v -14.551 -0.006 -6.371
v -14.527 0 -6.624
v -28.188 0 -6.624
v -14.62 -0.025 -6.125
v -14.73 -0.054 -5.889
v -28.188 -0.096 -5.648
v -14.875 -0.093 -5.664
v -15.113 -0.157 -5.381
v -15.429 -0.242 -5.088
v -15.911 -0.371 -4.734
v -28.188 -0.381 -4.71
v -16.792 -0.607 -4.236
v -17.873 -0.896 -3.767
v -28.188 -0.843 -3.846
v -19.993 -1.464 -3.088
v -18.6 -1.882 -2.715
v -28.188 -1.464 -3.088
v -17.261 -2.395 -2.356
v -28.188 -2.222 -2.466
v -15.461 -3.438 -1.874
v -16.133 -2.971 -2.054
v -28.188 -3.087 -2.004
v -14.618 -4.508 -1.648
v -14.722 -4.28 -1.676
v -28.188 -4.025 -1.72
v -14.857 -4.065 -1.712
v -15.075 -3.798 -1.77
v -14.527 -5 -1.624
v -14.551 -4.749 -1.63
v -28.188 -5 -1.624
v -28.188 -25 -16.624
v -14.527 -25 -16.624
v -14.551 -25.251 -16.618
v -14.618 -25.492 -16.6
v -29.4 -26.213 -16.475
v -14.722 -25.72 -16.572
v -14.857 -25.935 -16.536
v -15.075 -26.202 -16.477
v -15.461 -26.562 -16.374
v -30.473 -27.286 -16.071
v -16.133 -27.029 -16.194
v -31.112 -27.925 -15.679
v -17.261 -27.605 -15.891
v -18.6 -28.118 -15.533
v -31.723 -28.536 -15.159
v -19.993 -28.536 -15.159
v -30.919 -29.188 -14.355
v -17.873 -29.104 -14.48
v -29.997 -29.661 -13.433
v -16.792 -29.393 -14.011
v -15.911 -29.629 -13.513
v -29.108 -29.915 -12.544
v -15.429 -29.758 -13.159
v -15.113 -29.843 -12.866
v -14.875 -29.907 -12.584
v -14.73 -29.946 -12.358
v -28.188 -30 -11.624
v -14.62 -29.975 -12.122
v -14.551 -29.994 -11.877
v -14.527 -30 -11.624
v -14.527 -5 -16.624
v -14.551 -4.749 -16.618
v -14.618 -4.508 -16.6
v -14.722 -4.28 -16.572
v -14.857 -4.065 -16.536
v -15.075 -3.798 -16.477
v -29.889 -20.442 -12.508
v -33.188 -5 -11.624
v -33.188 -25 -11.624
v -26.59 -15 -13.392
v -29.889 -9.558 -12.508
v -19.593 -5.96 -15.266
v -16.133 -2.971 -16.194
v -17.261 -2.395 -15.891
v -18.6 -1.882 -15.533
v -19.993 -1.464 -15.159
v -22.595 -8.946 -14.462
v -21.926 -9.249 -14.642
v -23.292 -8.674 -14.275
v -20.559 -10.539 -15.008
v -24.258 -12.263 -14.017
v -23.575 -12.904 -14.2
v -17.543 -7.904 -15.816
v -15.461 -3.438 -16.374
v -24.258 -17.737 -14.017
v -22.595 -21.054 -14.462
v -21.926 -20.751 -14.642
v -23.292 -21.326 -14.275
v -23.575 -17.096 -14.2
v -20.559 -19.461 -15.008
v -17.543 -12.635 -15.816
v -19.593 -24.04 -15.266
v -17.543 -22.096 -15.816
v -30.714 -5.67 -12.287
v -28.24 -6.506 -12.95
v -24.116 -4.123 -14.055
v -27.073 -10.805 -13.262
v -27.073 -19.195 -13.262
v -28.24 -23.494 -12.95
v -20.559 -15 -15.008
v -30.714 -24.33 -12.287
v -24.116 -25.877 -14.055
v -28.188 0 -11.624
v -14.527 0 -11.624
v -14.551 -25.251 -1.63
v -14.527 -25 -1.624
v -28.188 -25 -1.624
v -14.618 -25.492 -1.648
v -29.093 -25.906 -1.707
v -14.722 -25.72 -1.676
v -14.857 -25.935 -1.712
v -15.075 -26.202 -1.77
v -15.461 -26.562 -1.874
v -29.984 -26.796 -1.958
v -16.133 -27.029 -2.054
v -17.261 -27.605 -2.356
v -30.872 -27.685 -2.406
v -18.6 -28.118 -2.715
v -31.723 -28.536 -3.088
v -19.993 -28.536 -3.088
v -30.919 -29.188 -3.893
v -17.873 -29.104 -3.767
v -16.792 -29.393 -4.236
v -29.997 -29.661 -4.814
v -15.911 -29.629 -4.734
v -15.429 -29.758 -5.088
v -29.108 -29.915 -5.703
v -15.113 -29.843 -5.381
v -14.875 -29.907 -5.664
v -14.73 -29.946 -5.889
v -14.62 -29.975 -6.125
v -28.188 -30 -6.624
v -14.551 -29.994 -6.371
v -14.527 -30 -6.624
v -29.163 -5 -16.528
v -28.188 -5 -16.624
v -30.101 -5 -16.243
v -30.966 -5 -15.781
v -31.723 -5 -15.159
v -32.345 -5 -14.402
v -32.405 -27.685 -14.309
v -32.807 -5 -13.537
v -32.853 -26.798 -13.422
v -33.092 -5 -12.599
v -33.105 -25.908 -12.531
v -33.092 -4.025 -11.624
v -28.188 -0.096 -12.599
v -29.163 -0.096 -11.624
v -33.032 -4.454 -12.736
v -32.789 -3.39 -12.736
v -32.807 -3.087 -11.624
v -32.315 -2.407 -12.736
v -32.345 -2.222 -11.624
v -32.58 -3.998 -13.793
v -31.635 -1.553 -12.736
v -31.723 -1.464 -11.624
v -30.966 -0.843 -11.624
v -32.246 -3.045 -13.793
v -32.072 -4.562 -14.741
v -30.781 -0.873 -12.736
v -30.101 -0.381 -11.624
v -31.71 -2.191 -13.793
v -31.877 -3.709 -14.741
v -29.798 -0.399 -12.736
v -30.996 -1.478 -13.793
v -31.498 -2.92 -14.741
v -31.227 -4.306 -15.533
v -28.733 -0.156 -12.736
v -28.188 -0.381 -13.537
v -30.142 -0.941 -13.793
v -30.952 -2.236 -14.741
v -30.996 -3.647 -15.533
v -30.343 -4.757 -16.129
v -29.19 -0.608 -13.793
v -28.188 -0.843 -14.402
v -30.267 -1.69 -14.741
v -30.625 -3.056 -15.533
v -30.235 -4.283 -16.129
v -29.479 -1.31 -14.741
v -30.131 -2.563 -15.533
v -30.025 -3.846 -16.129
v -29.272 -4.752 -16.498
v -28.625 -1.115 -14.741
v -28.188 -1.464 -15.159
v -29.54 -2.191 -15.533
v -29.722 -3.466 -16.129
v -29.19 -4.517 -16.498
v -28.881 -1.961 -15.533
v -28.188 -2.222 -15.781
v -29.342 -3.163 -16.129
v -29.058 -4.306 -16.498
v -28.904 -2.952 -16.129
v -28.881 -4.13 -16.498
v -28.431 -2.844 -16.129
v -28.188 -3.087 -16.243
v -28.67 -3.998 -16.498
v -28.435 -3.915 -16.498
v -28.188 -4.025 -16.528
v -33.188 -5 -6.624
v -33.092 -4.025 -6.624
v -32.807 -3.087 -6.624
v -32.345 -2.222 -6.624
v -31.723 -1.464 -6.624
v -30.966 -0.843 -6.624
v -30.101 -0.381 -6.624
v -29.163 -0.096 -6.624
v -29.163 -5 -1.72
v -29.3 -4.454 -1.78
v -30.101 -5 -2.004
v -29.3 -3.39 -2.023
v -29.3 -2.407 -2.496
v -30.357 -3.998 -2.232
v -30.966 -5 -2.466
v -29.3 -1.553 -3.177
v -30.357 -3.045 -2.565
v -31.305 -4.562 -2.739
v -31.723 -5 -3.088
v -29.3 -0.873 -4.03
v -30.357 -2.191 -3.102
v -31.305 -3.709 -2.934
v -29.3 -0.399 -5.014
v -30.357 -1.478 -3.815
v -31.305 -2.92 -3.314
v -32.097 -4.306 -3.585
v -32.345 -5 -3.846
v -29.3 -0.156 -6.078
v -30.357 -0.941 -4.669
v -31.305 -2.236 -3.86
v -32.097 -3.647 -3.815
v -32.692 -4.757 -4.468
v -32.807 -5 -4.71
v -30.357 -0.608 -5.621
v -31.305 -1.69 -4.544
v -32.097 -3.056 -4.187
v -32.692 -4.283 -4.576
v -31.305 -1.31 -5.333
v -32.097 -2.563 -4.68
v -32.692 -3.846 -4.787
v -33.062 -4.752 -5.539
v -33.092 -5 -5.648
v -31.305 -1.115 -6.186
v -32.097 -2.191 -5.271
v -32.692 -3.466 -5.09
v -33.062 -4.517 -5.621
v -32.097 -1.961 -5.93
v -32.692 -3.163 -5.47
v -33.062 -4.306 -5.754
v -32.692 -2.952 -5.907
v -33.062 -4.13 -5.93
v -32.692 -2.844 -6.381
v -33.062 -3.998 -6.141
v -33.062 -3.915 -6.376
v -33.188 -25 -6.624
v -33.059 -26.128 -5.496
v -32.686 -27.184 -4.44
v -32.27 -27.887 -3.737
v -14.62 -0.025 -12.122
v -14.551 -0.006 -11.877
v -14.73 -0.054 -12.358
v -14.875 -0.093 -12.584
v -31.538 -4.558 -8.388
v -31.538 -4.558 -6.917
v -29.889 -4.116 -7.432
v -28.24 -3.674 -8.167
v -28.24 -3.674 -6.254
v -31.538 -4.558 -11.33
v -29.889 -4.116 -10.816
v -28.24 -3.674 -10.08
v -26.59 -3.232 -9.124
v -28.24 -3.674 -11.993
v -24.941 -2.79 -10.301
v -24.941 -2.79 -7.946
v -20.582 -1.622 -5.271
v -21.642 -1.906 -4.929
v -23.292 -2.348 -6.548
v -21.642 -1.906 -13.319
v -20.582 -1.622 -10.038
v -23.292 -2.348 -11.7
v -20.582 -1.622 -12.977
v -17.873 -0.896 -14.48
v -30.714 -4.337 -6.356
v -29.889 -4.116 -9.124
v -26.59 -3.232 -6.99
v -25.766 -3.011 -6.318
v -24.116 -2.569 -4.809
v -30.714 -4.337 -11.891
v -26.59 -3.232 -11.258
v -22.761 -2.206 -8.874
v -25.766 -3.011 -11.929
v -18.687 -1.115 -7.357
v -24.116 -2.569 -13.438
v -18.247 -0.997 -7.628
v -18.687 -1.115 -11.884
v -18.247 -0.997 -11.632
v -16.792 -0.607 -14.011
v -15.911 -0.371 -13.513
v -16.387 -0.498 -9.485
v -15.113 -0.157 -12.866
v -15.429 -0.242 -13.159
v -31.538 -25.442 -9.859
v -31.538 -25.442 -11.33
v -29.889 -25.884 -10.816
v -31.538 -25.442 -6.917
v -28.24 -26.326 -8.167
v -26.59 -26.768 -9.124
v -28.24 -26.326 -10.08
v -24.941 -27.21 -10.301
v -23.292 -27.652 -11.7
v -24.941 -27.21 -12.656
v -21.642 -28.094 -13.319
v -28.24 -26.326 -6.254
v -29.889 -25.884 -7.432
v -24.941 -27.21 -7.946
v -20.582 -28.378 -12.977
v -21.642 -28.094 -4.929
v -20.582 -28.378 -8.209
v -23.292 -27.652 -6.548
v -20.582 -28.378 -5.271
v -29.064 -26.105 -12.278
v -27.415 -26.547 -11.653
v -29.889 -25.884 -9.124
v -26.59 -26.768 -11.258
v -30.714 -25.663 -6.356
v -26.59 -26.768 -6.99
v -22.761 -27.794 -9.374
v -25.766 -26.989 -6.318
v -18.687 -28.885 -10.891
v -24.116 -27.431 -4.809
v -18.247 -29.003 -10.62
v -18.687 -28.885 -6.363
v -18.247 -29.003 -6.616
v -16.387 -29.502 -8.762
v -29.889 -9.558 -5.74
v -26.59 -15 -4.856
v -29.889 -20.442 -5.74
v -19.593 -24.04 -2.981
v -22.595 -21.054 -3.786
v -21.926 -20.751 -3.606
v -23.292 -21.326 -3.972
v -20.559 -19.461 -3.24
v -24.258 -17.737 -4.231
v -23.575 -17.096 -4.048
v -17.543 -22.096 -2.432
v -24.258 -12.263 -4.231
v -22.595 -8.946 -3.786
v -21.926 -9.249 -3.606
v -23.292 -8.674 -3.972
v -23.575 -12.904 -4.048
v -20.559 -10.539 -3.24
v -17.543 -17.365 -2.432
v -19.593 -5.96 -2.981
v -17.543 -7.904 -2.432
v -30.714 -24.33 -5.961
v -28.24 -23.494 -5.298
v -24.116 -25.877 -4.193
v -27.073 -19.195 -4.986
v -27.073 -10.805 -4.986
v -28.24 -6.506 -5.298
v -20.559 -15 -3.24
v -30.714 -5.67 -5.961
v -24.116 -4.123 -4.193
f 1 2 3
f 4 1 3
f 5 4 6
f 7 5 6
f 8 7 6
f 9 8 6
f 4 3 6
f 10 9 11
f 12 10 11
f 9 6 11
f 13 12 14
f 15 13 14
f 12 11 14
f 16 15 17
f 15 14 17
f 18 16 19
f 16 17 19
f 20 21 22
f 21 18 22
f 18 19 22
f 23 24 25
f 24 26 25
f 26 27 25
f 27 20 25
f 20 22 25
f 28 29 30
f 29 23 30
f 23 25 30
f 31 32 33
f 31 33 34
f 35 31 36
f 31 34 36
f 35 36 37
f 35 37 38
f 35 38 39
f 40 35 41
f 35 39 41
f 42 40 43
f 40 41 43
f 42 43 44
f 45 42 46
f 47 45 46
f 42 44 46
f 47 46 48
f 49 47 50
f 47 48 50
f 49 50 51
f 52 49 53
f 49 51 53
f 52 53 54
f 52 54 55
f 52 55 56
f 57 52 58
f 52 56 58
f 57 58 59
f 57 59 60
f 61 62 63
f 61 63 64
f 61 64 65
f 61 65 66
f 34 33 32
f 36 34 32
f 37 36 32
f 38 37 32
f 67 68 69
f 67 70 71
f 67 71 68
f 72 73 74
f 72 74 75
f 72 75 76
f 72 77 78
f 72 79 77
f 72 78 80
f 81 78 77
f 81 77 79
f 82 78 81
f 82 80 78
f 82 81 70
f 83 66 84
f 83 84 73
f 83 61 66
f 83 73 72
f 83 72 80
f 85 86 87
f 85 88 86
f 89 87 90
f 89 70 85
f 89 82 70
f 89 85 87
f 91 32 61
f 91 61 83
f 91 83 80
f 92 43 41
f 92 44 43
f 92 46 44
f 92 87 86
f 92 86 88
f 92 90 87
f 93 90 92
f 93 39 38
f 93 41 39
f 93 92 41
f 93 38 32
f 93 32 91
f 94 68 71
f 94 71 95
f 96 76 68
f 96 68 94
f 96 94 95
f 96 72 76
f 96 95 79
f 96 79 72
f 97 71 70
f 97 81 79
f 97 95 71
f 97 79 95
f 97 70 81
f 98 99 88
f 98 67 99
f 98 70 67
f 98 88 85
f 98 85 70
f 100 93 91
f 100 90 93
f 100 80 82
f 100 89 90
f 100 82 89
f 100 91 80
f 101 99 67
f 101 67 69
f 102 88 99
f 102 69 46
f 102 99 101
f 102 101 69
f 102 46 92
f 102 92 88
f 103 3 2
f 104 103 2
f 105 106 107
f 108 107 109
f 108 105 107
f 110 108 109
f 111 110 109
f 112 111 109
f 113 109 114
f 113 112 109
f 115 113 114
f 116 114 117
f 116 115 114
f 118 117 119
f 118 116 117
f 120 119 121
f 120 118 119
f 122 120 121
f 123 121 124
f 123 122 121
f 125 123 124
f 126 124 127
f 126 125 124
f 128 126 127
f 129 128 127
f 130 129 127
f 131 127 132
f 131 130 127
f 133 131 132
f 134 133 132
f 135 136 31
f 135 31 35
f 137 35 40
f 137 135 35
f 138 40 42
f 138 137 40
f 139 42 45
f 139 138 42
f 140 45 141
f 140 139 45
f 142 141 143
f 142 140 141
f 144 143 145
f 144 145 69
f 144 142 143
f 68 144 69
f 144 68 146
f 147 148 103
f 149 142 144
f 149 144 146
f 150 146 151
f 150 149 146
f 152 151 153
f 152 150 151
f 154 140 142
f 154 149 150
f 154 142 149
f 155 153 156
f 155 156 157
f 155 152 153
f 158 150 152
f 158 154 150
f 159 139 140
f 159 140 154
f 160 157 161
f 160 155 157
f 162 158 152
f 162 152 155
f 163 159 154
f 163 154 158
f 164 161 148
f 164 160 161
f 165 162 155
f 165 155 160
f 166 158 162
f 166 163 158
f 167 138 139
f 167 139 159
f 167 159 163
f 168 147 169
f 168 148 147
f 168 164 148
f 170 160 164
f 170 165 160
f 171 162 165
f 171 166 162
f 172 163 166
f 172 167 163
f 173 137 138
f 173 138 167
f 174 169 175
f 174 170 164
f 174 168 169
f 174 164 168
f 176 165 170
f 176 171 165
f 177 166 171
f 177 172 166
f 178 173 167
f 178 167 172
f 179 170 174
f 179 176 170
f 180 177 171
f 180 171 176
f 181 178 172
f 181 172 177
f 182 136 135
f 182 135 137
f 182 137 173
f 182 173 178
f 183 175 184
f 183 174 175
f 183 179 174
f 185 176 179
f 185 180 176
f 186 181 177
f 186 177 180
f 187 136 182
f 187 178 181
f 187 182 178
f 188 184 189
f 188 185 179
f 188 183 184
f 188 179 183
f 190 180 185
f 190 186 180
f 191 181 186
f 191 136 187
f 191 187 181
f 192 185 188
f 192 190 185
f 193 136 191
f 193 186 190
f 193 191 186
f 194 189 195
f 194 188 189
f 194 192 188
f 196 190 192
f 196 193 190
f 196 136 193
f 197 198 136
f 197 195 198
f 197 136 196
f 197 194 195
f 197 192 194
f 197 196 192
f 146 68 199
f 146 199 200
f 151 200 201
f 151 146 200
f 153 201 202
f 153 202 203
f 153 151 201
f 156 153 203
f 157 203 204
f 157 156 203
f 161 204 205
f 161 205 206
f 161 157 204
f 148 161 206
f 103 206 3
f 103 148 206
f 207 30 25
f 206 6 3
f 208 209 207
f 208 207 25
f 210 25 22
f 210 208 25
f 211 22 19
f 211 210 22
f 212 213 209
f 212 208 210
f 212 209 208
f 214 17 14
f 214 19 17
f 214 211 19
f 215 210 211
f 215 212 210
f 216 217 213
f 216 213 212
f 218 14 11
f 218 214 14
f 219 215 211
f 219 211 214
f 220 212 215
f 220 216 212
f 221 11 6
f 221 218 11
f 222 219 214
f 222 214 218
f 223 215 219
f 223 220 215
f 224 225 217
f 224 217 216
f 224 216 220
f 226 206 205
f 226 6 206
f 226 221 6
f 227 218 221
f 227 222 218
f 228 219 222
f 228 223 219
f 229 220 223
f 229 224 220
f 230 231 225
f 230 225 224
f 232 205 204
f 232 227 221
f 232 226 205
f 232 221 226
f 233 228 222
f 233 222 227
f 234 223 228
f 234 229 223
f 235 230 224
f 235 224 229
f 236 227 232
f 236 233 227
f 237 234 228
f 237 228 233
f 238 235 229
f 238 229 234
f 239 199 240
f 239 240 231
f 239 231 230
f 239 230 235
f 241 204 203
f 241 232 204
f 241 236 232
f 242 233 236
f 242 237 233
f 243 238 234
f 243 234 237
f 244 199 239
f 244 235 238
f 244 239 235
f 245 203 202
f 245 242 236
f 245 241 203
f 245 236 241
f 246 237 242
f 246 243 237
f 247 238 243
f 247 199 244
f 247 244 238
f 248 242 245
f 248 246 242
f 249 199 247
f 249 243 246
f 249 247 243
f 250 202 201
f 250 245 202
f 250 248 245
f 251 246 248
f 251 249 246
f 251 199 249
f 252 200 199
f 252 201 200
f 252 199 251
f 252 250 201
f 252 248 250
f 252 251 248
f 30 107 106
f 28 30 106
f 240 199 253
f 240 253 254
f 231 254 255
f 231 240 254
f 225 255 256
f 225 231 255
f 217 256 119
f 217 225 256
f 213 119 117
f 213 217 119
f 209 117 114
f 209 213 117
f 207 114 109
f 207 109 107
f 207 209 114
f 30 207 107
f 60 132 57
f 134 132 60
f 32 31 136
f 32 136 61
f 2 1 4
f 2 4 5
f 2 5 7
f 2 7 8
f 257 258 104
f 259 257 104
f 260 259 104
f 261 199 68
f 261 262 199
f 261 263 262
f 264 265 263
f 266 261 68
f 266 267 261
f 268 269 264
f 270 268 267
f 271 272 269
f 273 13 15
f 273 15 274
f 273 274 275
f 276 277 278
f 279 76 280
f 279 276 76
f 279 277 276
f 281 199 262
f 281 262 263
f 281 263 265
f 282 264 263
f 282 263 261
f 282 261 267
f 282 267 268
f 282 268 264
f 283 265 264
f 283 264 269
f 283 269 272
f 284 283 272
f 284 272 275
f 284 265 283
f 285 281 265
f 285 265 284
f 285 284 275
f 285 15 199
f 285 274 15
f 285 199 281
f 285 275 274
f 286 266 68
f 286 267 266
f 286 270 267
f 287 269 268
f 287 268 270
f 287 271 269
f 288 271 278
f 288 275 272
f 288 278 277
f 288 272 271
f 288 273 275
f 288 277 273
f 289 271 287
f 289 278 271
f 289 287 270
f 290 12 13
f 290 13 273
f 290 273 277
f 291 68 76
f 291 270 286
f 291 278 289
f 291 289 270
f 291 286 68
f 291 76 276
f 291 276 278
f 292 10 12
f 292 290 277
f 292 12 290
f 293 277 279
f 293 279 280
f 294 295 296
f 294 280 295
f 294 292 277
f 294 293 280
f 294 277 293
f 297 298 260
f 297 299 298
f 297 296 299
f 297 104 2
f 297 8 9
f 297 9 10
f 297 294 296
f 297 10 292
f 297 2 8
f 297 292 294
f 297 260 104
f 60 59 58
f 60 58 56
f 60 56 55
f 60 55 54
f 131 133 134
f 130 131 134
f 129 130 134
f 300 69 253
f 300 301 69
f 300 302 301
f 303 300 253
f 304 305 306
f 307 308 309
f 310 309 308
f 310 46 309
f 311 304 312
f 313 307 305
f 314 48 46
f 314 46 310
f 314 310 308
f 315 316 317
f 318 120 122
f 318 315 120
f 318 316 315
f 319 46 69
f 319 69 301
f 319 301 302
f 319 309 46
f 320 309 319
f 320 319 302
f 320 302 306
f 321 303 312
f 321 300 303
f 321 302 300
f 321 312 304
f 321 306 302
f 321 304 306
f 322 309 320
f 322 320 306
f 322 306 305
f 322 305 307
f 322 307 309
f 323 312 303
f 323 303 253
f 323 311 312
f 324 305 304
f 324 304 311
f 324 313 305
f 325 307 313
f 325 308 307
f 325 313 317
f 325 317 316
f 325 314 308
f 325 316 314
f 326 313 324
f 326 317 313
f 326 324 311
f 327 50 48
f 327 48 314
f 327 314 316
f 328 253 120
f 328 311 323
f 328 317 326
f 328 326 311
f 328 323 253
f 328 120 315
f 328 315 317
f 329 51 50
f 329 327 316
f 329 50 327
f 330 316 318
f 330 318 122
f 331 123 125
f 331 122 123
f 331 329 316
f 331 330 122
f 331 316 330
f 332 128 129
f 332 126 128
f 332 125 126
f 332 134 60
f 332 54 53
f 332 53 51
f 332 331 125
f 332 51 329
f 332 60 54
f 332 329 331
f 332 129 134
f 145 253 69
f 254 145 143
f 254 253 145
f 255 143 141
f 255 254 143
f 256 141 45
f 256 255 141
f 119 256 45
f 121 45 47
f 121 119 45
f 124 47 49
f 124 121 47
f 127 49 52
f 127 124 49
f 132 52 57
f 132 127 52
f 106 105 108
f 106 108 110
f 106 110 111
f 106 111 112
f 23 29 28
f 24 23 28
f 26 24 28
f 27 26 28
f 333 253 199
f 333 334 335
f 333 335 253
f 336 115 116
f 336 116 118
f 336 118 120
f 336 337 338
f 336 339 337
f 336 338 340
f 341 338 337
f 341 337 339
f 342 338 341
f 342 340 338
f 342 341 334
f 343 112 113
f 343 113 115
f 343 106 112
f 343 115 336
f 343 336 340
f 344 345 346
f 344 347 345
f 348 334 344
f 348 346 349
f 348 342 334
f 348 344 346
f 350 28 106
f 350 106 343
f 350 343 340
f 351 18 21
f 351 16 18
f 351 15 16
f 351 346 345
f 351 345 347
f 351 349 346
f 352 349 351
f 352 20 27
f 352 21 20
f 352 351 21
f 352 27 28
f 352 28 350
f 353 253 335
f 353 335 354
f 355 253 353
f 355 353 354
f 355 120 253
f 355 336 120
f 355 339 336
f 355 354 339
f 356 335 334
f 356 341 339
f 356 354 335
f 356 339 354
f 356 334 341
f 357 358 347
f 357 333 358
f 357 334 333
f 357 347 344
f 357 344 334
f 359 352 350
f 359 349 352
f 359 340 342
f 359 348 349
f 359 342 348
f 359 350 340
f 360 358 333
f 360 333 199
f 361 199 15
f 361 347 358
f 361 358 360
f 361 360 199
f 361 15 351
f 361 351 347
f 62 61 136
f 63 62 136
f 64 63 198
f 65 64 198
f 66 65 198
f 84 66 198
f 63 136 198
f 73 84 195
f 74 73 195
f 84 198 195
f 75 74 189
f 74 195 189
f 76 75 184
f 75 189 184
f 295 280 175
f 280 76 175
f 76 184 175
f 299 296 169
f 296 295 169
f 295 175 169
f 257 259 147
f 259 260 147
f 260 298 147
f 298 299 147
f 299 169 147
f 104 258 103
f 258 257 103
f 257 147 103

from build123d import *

# Parameters (mm, degrees)
F0_W         = 50
F0_H         = 15
F1_DEPTH     = 30
F2_R         = 5
F3_T1_DEPTH  = 52.5
F3_T3_DEPTH  = 5
F3_T5_DEPTH  = 32.5
F3_S9_W      = 5.1
F3_S9_H      = 5.1
F3_T10_DEPTH = 5.1
F3_S15_W     = 5.1
F3_S15_H     = 5.1
F3_T16_DEPTH = 5.1
F4_DEPTH     = 20
F1_FACE1_W   = 20
F1_FACE1_H   = 5
F5_DEPTH     = 57.6854757965
F5_TAPER     = -15


# Not quite as in the source:
# - a fillet or chamfer that OpenCascade refuses, or shapes differently, is made with other operations: its cross-section is extruded or revolved along the edge and cut away or added


with BuildPart() as f1:
    # F0 (on Front) → F1 (new body)
    with BuildSketch(Plane.XZ):
        with Locations((-8.187652571, -9.1238242388)):
            Rectangle(F0_W, F0_H)
    extrude(amount=F1_DEPTH)

    # F2
    f2_edges = [f1.edges().sort_by_distance(p)[0] for p in [
        (16.812347, -15, -16.623824),
        (16.812347, -15, -1.623824),
        (16.812347, 0, -9.123824),
        (16.812347, -30, -9.123824),
        (-8.187653, -30, -16.623824),
        (-8.187653, -30, -1.623824),
        (-33.187653, -30, -9.123824),
    ]]
    fillet(f2_edges, radius=F2_R)

    # F3: fillet of radius 5 on 7 edges, made by hand

    # F3_s2 → F3_t1 (cut)
    with BuildSketch(Plane.YZ.offset(-28.187652571)):
        with BuildLine():
            ThreePointArc((-5, -16.6238242388), (-1.4644660941, -15.1593581447), (0, -11.6238242388))
            Line((0, -11.6238242388), (0, -16.6238242388))
            Line((0, -16.6238242388), (-5, -16.6238242388))
        make_face()
        with BuildLine():
            ThreePointArc((0, -6.6238242388), (-1.4644660941, -3.0882903328), (-5, -1.6238242388))
            Line((-5, -1.6238242388), (0, -1.6238242388))
            Line((0, -1.6238242388), (0, -6.6238242388))
        make_face()
    extrude(amount=F3_T1_DEPTH, mode=Mode.SUBTRACT)

    # F3_s4 → F3_t3 (cut)
    with BuildSketch(Plane.XY.offset(-11.6238242388)):
        with BuildLine():
            ThreePointArc((-33.187652571, -5), (-31.7231864769, -1.4644660941), (-28.187652571, 0))
            Line((-28.187652571, 0), (-33.187652571, 0))
            Line((-33.187652571, 0), (-33.187652571, -5))
        make_face()
    extrude(amount=F3_T3_DEPTH, mode=Mode.SUBTRACT)

    # F3_s6 → F3_t5 (cut)
    with BuildSketch(Plane.XZ.offset(5)):
        with BuildLine():
            ThreePointArc((-33.187652571, -6.6238242388), (-31.7231864769, -3.0882903328), (-28.187652571, -1.6238242388))
            Line((-28.187652571, -1.6238242388), (-33.187652571, -1.6238242388))
            Line((-33.187652571, -1.6238242388), (-33.187652571, -6.6238242388))
        make_face()
        with BuildLine():
            ThreePointArc((-28.187652571, -16.6238242388), (-31.7231864769, -15.1593581447), (-33.187652571, -11.6238242388))
            Line((-33.187652571, -11.6238242388), (-33.187652571, -16.6238242388))
            Line((-33.187652571, -16.6238242388), (-28.187652571, -16.6238242388))
        make_face()
    extrude(amount=F3_T5_DEPTH, mode=Mode.SUBTRACT)


with BuildPart() as f3_tool8:
    # F3_s9 → F3_t10 (new body)
    with BuildSketch(Plane.XY.offset(-11.6238242388)):
        with Locations((-30.737652571, -2.45)):
            Rectangle(F3_S9_W, F3_S9_H)
    extrude(amount=-F3_T10_DEPTH)

    # F3_s11 → F3_t12 (revolve, cut)
    with BuildSketch(Plane(origin=(-28.187652571, -5, -11.6238242388), x_dir=(0.7071067812, -0.7071067812, 0), z_dir=(0.7071067812, 0.7071067812, 0))):
        with BuildLine():
            ThreePointArc((0, -5), (5, 0), (0, 5))
            Line((0, 5), (0, -5))
        make_face()
    revolve(axis=Axis((-28.187652571, -5, -11.6238242388), (0, 0, -1)), mode=Mode.SUBTRACT)


with BuildPart() as f1_1:
    add(f1.part)

    # F3_t7: cut F3_tool8
    add(f3_tool8.part, mode=Mode.SUBTRACT)


with BuildPart() as f3_tool14:
    # F3_s15 → F3_t16 (new body)
    with BuildSketch(Plane.YZ.offset(-28.187652571)):
        with Locations((-2.45, -4.0738242388)):
            Rectangle(F3_S15_W, F3_S15_H)
    extrude(amount=-F3_T16_DEPTH)

    # F3_s17 → F3_t18 (revolve, cut)
    with BuildSketch(Plane(origin=(-28.187652571, -5, -6.6238242388), x_dir=(0, -0.7071067812, -0.7071067812), z_dir=(0, 0.7071067812, -0.7071067812))):
        with BuildLine():
            ThreePointArc((0, -5), (5, 0), (0, 5))
            Line((0, 5), (0, -5))
        make_face()
    revolve(axis=Axis((-28.187652571, -5, -6.6238242388), (-1, 0, 0)), mode=Mode.SUBTRACT)


with BuildPart() as f1_2:
    add(f1_1.part)

    # F3_t13: cut F3_tool14
    add(f3_tool14.part, mode=Mode.SUBTRACT)

    # F4 (cut): a face of the model
    f4_faces = [f1_2.faces().sort_by_distance(p)[0] for p in [
        (16.812347429, -15, -9.1238242388),
    ]]
    extrude(f4_faces, amount=-F4_DEPTH, mode=Mode.SUBTRACT)

    # F1_face1 (on face) → F5 (cut)
    with BuildSketch(Plane(origin=(-33.187652571, -15, -9.1238242388), x_dir=(0, -1, 0), z_dir=(-1, 0, 0))):
        Rectangle(F1_FACE1_W, F1_FACE1_H)
    extrude(amount=-F5_DEPTH, taper=F5_TAPER, mode=Mode.SUBTRACT)


solid = f1_2.part
